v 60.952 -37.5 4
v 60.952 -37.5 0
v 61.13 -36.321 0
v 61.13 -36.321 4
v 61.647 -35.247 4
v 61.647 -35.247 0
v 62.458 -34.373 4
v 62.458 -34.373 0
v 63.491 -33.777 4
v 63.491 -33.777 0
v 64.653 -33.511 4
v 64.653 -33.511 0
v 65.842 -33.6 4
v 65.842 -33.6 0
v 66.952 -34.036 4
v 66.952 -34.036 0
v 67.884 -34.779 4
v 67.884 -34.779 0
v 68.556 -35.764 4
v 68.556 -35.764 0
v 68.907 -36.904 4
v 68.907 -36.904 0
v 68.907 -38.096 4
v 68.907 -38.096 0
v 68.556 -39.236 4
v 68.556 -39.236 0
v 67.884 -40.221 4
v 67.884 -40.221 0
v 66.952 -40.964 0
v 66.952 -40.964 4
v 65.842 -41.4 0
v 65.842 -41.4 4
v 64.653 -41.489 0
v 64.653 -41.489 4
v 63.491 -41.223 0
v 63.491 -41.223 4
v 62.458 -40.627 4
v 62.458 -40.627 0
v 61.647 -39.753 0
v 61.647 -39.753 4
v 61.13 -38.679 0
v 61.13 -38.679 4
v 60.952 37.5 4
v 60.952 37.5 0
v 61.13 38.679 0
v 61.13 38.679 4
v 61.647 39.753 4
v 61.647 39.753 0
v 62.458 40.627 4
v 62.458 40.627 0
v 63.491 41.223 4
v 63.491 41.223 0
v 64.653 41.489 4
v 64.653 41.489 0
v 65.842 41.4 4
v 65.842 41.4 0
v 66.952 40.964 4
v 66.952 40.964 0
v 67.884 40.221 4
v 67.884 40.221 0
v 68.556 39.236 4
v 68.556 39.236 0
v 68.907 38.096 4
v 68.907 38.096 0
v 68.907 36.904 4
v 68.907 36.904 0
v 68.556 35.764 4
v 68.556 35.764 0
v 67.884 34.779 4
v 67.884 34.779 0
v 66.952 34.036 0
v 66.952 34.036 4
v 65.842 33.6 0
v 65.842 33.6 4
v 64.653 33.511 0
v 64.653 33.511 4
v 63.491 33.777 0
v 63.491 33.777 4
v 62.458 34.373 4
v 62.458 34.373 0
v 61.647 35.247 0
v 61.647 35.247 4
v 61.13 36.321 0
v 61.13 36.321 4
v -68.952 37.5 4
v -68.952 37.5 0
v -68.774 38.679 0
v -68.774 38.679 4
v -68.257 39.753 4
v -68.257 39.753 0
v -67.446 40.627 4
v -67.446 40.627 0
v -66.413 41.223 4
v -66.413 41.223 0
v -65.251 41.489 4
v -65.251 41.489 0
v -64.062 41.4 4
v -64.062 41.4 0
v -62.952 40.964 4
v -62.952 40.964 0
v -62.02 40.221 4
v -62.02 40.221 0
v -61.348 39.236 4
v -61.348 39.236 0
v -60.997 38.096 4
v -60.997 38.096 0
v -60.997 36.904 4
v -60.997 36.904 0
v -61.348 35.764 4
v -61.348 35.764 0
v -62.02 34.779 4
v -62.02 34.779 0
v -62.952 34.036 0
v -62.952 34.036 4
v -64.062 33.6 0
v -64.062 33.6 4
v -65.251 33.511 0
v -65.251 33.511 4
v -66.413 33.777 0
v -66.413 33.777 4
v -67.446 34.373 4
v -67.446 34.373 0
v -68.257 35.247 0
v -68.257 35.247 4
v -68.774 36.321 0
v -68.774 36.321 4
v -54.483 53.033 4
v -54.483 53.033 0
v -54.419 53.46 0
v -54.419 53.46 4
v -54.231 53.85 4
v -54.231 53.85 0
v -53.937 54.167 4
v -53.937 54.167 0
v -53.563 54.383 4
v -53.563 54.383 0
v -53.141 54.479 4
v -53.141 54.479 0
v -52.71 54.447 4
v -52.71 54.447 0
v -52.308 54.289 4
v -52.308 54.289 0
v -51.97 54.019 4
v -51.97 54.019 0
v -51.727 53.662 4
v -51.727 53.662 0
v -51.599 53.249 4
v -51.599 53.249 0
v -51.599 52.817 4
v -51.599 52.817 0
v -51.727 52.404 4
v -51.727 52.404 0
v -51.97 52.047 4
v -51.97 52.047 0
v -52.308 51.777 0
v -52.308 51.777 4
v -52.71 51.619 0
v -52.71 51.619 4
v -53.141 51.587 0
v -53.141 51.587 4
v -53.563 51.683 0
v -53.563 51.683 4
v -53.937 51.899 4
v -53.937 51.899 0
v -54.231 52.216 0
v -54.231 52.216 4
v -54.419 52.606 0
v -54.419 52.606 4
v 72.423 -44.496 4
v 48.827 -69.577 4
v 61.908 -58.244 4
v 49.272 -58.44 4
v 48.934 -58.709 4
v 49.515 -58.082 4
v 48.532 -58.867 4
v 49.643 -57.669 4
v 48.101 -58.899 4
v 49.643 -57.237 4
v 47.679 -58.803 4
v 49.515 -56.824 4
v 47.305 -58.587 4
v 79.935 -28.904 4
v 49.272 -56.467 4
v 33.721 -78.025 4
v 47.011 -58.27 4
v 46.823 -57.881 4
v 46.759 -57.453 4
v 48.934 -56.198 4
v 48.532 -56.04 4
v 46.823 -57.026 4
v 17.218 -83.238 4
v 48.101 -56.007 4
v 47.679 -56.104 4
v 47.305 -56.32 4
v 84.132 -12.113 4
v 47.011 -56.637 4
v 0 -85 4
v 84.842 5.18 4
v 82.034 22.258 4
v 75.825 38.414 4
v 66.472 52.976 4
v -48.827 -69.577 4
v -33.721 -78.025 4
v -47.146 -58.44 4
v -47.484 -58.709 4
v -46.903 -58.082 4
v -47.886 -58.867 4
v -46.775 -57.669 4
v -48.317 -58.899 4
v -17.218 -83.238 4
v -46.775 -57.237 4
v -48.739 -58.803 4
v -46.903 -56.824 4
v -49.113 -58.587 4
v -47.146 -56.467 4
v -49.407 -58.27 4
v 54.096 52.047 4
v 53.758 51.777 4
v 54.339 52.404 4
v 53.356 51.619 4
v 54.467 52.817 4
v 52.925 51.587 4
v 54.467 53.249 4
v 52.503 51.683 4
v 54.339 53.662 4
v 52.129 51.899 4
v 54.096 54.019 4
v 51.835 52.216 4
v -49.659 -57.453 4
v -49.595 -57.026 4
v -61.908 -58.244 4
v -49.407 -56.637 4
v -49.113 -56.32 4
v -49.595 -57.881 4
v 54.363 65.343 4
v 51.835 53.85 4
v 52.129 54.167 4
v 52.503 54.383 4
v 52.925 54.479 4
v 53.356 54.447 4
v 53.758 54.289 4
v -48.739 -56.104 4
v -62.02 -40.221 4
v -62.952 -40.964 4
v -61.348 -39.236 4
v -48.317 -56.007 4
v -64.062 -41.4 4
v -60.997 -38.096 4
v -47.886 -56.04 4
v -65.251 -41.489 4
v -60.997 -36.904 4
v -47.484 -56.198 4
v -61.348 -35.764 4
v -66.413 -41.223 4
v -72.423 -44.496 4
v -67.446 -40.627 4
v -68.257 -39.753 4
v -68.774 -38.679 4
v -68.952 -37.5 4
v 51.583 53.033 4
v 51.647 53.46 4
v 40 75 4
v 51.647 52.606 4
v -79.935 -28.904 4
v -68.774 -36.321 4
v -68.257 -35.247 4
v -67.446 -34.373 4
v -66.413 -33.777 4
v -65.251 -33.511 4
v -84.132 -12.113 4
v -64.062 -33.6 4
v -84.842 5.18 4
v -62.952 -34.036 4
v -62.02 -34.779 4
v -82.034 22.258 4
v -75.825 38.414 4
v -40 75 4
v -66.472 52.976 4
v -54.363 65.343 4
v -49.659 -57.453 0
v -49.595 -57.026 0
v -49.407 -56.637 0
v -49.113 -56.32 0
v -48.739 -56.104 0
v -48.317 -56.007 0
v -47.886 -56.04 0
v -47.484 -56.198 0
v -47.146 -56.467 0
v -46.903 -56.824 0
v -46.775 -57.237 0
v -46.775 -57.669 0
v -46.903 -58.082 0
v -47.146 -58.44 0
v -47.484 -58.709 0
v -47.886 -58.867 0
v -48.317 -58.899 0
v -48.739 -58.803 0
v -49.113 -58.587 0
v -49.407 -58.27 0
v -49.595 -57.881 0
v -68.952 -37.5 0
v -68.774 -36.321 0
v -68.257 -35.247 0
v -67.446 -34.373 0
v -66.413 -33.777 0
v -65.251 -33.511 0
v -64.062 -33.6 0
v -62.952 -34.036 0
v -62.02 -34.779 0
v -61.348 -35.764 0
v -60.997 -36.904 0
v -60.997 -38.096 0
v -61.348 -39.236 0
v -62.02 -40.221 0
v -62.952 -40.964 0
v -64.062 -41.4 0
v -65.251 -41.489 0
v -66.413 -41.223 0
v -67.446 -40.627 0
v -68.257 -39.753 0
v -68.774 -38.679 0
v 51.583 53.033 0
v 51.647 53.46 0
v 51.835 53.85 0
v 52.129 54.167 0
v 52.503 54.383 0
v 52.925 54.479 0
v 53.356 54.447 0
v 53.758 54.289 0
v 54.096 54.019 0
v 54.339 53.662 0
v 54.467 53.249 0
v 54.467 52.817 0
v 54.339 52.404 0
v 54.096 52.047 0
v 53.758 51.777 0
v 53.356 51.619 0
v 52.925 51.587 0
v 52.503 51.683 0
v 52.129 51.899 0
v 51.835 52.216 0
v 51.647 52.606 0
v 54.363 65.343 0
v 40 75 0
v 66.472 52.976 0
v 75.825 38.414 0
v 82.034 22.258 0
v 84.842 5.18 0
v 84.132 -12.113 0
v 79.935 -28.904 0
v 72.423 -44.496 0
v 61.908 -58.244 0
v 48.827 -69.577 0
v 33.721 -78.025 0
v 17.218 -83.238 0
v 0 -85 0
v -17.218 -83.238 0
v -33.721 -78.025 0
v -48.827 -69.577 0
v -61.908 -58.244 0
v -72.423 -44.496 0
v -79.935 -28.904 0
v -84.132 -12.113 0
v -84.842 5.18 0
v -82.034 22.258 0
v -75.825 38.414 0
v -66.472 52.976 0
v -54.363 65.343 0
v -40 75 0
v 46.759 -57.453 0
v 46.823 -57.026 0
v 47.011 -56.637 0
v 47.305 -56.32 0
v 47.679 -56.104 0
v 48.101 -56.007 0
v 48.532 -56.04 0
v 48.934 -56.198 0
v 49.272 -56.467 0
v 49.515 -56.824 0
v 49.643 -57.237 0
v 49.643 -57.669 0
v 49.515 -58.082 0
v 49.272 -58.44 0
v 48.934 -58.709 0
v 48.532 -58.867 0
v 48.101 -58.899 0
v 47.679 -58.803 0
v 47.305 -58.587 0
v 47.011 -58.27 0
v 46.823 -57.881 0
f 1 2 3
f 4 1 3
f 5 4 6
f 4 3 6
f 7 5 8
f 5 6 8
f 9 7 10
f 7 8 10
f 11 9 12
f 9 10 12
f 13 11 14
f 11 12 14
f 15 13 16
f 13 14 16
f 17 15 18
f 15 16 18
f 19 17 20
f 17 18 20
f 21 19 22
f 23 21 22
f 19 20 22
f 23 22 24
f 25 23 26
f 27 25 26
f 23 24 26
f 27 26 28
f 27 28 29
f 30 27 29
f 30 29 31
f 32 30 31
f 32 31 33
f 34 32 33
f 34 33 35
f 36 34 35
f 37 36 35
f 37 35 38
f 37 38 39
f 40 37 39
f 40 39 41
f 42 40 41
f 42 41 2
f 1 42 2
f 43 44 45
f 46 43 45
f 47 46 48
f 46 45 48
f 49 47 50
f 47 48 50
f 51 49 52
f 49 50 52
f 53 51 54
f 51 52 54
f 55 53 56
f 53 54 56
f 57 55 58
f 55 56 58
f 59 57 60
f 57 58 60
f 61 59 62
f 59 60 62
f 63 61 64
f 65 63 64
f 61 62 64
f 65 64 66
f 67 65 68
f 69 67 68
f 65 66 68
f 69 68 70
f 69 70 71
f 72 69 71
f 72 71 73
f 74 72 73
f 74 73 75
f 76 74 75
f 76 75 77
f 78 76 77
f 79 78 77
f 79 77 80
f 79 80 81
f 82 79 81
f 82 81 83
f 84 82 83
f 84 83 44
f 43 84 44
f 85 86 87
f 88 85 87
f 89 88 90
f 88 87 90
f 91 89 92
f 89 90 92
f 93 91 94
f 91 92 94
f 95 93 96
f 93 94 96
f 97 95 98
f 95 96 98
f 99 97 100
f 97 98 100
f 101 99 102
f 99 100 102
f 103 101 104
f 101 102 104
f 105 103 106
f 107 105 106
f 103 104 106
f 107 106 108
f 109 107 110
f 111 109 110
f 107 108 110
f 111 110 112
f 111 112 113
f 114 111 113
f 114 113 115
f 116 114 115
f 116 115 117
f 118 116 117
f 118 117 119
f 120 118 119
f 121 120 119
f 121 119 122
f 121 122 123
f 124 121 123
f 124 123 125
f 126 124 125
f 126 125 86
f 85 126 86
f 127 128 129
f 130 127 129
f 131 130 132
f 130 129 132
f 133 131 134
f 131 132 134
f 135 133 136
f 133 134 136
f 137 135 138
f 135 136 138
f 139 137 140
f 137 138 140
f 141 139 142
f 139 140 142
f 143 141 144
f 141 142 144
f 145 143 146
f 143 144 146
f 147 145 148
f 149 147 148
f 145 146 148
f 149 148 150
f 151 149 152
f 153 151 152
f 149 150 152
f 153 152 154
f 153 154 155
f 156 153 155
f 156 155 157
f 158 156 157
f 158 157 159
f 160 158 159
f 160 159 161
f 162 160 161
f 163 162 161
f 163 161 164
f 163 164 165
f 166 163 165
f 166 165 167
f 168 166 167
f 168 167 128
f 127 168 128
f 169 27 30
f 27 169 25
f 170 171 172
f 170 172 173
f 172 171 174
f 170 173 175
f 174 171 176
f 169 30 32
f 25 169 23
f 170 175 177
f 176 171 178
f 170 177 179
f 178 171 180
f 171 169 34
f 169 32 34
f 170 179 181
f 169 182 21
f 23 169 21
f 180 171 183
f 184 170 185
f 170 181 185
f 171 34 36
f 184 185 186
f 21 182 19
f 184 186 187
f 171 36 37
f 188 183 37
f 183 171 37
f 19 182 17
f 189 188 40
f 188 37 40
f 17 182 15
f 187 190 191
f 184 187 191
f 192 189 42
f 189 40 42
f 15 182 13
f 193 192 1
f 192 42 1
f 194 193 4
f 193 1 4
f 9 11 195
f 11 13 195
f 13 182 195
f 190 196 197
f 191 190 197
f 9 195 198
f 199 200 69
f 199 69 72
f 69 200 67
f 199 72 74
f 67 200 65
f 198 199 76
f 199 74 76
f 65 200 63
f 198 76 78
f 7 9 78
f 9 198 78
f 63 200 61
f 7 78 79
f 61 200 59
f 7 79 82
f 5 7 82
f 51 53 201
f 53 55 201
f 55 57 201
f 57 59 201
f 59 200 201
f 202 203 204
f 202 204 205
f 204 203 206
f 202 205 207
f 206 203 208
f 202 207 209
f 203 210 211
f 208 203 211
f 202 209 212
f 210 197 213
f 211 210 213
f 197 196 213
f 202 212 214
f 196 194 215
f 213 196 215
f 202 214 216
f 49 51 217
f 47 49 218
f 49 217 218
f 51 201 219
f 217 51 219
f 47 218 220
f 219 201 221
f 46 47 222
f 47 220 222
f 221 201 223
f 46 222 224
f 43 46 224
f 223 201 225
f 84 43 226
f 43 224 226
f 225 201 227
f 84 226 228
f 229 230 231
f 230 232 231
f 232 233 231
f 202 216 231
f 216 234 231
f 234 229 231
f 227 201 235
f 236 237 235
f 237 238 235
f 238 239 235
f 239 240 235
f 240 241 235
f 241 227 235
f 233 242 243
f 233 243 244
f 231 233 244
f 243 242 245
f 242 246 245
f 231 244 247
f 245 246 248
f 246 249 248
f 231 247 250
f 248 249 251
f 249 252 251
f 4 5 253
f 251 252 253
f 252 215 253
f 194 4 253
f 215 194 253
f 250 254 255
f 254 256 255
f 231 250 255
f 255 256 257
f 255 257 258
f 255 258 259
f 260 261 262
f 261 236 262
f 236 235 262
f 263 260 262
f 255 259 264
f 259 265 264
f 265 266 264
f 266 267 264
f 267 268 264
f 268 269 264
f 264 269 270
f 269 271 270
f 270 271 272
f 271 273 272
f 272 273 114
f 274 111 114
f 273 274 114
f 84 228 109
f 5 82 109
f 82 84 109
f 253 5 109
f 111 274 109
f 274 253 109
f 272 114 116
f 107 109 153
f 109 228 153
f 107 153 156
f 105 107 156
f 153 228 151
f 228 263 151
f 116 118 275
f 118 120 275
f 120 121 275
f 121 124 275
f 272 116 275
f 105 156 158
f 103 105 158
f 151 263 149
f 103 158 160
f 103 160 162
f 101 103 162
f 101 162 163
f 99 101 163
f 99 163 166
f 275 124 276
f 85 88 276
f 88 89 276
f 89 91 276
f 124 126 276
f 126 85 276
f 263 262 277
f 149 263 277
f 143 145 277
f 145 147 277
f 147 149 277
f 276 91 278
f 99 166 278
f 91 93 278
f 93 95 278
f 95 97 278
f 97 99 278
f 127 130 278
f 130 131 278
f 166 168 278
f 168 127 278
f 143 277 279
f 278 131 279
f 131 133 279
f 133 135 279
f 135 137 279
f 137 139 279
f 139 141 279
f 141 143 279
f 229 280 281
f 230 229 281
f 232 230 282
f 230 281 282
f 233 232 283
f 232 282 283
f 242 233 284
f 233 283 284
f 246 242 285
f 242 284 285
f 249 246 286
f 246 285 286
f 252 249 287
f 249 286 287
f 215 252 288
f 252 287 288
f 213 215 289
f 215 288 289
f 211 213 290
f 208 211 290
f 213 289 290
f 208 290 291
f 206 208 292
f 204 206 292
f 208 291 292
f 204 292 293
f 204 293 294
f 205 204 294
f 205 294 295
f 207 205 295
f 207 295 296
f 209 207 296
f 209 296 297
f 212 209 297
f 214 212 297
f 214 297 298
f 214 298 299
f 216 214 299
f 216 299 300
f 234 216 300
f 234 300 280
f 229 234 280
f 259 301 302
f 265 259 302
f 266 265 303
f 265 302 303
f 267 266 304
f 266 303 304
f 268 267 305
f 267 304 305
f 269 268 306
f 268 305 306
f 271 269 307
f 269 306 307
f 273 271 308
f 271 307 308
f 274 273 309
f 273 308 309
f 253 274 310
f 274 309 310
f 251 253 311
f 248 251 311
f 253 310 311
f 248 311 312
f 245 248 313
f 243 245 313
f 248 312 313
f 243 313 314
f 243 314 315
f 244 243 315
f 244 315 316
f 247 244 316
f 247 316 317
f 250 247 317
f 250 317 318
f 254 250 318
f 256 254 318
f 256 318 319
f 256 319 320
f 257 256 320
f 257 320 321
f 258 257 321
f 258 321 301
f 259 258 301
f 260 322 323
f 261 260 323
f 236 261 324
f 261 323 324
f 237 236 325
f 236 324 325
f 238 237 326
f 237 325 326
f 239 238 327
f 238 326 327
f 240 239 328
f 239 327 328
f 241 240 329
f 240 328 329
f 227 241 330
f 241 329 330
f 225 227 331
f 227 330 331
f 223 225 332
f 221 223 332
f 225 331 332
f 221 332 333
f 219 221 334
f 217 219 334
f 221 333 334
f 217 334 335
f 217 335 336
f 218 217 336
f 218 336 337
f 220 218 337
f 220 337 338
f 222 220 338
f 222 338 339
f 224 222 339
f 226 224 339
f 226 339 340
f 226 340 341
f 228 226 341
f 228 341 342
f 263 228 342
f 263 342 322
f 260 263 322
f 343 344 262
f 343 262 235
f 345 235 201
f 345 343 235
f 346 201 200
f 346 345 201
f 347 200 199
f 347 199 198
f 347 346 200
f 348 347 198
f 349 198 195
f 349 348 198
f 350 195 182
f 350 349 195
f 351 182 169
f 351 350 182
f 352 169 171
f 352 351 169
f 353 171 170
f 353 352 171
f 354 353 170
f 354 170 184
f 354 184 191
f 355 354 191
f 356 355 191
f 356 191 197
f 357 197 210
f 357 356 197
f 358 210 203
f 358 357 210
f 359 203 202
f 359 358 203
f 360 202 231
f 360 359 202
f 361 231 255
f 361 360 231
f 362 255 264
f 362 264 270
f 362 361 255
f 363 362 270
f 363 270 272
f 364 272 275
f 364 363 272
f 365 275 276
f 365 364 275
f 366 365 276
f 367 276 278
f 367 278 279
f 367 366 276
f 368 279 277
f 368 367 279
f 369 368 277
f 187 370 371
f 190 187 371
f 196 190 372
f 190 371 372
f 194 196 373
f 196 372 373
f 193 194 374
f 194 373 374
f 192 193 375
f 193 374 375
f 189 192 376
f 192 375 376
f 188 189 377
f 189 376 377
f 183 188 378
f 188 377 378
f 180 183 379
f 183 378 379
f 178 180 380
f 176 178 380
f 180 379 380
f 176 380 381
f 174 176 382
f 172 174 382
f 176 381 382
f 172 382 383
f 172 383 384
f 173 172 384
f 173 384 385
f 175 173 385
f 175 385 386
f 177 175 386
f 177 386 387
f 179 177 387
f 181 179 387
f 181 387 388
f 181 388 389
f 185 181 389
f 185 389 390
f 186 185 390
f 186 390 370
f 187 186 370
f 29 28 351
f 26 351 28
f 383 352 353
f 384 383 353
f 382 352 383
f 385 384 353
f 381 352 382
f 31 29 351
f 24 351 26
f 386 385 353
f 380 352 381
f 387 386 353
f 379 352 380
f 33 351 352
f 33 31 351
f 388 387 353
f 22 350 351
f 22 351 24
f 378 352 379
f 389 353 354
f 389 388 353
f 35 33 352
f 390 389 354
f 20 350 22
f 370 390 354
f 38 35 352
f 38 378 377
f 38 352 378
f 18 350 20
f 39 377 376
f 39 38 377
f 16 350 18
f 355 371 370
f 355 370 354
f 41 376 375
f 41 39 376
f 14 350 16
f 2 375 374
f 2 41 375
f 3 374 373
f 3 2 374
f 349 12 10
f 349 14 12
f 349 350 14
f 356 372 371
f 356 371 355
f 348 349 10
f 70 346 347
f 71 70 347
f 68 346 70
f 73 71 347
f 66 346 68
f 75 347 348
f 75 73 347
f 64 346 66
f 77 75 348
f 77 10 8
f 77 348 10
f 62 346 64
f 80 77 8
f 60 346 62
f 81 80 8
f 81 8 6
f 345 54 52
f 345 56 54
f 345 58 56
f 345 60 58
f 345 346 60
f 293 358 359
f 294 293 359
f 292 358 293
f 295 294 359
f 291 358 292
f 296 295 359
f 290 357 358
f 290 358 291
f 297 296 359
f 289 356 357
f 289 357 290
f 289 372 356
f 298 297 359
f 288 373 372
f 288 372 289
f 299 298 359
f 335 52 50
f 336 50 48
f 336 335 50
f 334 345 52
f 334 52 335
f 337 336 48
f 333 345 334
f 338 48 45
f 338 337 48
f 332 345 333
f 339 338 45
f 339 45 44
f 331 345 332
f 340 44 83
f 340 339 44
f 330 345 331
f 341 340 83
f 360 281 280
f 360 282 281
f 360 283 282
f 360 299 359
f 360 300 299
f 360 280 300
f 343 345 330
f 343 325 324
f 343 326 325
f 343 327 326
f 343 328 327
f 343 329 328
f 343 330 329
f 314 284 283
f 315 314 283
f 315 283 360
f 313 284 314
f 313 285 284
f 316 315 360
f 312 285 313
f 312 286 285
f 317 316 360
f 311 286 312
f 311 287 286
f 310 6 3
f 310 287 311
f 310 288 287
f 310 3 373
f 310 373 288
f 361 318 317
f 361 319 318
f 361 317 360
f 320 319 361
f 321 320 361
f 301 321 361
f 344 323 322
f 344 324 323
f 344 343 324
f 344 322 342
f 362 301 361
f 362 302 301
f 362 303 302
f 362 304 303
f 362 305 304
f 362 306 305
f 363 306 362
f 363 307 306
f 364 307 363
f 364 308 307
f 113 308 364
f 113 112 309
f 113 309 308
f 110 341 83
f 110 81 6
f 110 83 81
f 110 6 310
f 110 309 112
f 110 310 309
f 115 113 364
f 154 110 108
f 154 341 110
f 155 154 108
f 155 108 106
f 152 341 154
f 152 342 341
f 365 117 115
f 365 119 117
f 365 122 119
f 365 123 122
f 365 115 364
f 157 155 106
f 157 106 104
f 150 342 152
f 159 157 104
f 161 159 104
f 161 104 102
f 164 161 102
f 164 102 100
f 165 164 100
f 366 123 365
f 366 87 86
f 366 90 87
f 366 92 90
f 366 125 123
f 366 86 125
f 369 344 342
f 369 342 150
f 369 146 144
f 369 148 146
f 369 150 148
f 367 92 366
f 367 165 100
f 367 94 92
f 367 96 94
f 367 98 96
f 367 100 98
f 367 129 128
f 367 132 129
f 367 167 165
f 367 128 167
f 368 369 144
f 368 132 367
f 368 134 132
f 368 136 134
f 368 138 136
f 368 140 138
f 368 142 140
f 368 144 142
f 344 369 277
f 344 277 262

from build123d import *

# Parameters (mm, degrees)
RESSALTO_EXTRUS_O1_DEPTH      = 4
FURO_COM_FOLGA_DE_M2_51_D     = 2.9
FURO_COM_FOLGA_DE_M2_51_DEPTH = 7.25
FURO_COM_FOLGA_DE_M2_51_TIP   = 0.871247898
FUROS_GUIA_COM_8_0MM1_D       = 8
FUROS_GUIA_COM_8_0MM1_DEPTH   = 7.25
FUROS_GUIA_COM_8_0MM1_TIP     = 2.403442476


with BuildPart() as part:
    # Esboço1 → Ressalto-extrusão1 (new body)
    with BuildSketch(Plane.XY):
        with BuildLine():
            Line((-40, 75), (40, 75))
            ThreePointArc((40, 75), (0, -85), (-40, 75))
        make_face()
    extrude(amount=RESSALTO_EXTRUS_O1_DEPTH)

    # Furo com folga de M2.51
    with Locations(Plane(origin=(-53.033008589, 53.033008589, 4), x_dir=(1, 0, 0), z_dir=(0, 0, 1))):
        with Locations((0, 0), (106.066017178, 0), (101.242079315, -110.486341823), (4.823937863, -110.486341823)):
            Hole(FURO_COM_FOLGA_DE_M2_51_D / 2, depth=FURO_COM_FOLGA_DE_M2_51_DEPTH)
            with Locations((0, 0, -(FURO_COM_FOLGA_DE_M2_51_DEPTH + FURO_COM_FOLGA_DE_M2_51_TIP / 2))):  # 118° drill point
                Cone(0, FURO_COM_FOLGA_DE_M2_51_D / 2, FURO_COM_FOLGA_DE_M2_51_TIP, mode=Mode.SUBTRACT)

    # Furos-guia com Ø8.0mm1
    with Locations(Plane(origin=(-64.951905284, 37.5, 4), x_dir=(1, 0, 0), z_dir=(0, 0, 1))):
        with Locations((0, 0), (0, -75), (129.903810568, 0), (129.903810568, -75)):
            Hole(FUROS_GUIA_COM_8_0MM1_D / 2, depth=FUROS_GUIA_COM_8_0MM1_DEPTH)
            with Locations((0, 0, -(FUROS_GUIA_COM_8_0MM1_DEPTH + FUROS_GUIA_COM_8_0MM1_TIP / 2))):  # 118° drill point
                Cone(0, FUROS_GUIA_COM_8_0MM1_D / 2, FUROS_GUIA_COM_8_0MM1_TIP, mode=Mode.SUBTRACT)


solid = part.part
